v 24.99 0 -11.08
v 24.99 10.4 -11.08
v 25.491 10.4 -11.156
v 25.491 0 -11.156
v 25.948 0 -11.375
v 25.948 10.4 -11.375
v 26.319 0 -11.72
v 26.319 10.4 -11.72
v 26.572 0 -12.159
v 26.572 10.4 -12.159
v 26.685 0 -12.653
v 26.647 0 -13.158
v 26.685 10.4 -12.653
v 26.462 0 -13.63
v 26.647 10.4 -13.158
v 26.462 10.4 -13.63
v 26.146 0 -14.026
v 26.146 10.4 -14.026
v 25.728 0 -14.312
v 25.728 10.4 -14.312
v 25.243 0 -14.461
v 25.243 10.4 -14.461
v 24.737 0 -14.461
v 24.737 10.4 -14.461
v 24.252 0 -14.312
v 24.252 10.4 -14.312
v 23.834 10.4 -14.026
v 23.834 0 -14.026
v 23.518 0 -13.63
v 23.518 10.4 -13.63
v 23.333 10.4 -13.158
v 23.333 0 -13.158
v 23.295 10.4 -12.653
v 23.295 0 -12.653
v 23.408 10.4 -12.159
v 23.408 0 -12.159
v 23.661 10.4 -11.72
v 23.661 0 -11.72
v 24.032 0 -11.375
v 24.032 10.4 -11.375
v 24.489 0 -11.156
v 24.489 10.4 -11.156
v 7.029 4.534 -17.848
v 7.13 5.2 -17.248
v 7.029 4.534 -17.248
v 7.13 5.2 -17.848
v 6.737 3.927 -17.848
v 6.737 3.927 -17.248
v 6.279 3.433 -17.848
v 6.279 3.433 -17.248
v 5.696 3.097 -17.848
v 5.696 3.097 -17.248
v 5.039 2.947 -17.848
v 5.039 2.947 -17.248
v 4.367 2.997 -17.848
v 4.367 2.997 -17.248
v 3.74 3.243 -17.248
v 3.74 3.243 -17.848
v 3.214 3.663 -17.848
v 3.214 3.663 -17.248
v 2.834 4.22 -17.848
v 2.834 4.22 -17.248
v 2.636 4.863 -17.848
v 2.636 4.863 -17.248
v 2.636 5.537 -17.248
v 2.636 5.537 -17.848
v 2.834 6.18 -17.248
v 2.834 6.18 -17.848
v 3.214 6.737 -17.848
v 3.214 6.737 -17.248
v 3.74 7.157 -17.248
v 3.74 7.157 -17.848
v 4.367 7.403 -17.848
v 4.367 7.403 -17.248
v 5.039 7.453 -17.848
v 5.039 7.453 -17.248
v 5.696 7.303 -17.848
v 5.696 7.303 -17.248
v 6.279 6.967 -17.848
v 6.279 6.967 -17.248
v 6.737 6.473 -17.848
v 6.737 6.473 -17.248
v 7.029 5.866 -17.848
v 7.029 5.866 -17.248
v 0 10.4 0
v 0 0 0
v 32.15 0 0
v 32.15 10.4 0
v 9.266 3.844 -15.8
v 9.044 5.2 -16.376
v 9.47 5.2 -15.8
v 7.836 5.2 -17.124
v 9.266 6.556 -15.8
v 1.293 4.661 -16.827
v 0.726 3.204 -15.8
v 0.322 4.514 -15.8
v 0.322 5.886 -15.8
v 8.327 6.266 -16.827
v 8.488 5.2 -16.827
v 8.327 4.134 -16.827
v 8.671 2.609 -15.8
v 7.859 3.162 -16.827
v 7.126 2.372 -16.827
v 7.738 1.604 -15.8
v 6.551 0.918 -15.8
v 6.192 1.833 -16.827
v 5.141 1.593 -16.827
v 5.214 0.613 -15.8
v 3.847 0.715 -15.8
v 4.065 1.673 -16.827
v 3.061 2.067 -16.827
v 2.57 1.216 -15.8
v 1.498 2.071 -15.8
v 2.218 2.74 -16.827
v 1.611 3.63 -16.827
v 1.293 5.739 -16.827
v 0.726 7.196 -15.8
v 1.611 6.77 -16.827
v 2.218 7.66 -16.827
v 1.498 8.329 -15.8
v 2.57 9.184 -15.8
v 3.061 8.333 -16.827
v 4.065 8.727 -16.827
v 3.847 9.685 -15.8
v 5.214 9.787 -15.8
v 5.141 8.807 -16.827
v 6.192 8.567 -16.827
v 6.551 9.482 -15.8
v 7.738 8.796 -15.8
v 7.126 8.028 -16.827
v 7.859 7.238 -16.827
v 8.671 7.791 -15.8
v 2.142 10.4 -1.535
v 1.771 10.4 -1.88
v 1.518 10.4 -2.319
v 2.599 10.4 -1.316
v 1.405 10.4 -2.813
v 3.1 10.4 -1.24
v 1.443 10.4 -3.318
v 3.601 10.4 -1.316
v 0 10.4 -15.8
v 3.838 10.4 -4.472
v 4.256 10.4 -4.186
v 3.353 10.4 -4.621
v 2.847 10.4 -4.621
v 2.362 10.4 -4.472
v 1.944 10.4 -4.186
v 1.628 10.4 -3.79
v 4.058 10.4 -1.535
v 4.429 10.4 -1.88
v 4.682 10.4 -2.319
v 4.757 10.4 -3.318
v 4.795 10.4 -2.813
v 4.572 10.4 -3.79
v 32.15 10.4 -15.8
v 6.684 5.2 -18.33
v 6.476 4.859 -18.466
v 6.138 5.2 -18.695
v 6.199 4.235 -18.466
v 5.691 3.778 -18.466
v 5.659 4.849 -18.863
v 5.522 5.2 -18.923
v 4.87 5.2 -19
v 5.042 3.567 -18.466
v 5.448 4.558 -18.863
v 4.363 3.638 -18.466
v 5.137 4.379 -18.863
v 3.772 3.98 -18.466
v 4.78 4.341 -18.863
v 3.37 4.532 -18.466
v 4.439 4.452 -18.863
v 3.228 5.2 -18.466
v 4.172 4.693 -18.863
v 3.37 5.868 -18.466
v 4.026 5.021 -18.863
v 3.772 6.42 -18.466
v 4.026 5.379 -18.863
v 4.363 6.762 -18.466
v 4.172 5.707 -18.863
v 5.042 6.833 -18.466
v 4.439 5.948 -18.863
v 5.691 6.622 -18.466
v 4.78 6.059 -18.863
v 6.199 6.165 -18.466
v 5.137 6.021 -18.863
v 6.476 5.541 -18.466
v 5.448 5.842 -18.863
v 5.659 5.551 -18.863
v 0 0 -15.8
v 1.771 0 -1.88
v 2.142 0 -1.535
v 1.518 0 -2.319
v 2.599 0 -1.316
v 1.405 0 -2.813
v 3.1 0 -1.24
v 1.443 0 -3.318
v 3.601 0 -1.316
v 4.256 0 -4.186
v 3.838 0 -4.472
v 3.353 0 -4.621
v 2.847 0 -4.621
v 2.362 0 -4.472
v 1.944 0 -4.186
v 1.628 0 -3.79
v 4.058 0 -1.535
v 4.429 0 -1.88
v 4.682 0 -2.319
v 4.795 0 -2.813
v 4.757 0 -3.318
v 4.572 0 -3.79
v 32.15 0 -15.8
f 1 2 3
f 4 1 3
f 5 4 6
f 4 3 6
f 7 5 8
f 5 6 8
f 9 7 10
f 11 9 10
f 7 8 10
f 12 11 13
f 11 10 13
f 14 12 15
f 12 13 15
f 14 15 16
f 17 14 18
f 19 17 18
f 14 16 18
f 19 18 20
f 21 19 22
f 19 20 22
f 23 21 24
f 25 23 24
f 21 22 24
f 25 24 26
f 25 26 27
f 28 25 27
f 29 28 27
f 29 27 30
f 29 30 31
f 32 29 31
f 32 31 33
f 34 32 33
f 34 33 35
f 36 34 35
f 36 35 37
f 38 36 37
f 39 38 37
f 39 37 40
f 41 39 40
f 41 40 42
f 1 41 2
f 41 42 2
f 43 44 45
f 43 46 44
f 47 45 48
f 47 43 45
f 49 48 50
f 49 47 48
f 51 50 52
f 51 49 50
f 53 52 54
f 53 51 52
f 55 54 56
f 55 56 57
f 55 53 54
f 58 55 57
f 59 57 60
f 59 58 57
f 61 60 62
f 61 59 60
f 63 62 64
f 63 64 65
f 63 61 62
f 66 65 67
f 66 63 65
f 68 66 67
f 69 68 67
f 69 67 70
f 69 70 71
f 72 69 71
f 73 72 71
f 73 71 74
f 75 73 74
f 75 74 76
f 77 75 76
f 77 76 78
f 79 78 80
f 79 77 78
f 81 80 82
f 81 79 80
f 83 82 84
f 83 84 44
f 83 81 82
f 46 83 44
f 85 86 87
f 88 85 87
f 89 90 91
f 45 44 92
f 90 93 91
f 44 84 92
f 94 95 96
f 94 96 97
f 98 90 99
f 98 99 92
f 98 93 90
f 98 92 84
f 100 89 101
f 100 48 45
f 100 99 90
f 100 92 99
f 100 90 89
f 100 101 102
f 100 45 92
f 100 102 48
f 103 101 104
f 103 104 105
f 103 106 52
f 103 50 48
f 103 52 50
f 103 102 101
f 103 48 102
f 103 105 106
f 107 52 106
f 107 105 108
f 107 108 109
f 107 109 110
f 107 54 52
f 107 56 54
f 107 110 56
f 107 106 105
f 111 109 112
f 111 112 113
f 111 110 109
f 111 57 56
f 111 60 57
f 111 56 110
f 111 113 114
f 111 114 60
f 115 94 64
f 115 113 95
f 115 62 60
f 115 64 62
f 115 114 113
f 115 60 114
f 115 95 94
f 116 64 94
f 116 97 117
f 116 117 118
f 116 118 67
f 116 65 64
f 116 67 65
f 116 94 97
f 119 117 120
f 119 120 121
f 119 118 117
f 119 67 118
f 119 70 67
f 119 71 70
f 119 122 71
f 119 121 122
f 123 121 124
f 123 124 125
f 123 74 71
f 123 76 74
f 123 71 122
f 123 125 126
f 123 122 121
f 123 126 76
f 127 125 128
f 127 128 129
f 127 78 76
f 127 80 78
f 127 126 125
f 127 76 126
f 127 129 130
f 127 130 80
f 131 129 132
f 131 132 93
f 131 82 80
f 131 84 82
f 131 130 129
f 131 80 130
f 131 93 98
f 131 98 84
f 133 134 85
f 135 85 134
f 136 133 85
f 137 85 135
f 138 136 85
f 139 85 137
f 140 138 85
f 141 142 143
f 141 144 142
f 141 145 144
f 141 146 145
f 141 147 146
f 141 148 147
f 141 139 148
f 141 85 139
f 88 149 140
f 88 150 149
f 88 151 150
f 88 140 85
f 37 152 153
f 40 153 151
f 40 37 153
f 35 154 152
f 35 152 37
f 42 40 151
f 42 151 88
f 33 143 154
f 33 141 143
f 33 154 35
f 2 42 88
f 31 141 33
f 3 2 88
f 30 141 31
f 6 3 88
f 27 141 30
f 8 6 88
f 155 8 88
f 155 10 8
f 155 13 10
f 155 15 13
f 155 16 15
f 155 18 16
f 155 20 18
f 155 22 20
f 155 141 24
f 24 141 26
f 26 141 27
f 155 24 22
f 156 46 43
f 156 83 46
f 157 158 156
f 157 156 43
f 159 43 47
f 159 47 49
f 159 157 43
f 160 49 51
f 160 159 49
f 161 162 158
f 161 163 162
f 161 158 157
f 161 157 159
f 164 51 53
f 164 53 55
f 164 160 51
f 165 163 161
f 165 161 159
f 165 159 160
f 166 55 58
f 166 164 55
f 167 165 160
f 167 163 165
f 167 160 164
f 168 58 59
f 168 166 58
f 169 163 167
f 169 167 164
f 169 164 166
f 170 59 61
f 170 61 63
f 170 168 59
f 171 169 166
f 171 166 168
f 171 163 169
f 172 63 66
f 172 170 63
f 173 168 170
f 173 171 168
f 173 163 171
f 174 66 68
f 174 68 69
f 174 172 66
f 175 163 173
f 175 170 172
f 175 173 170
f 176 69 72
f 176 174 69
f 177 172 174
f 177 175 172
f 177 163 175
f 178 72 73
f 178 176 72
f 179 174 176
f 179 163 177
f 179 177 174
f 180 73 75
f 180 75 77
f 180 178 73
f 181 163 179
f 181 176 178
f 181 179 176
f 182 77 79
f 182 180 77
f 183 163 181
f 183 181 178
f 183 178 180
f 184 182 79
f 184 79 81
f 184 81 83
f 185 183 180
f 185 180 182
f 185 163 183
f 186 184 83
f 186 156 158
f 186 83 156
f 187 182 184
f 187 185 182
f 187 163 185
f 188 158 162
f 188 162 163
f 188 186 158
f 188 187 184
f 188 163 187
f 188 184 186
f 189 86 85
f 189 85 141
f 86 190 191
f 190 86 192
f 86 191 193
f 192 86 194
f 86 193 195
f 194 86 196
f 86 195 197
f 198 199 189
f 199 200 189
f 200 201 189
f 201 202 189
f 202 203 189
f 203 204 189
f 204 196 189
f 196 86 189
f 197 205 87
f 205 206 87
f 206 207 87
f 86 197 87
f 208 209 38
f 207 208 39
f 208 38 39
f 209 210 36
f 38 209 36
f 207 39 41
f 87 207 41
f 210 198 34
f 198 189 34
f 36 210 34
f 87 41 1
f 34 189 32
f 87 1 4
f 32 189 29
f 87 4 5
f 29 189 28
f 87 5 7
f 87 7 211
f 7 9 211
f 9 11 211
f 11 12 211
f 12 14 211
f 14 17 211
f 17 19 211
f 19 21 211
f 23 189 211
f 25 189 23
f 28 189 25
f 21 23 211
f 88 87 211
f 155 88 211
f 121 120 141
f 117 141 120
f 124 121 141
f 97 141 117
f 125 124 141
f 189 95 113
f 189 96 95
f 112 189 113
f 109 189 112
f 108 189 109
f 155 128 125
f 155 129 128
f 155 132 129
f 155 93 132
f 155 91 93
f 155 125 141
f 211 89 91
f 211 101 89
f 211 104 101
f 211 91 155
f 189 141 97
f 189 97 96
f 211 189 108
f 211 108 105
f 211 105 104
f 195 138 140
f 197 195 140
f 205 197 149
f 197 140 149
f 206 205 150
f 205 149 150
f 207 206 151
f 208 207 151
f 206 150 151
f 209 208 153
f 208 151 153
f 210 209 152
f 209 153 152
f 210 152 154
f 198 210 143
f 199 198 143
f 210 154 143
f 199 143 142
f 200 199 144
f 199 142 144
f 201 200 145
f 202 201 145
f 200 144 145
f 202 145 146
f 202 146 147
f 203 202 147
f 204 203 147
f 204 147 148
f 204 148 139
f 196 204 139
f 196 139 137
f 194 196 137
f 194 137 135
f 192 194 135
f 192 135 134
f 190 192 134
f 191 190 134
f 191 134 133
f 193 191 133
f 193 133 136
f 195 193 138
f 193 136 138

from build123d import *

# Parameters (mm, degrees)
SKETCH2_W           = 32.15
SKETCH2_H           = 15.8
BOSS_EXTRUDE1_DEPTH = 10.4
SKETCH3_R           = 1.7
CUT_EXTRUDE1_DEPTH  = 10.4


with BuildPart() as part:
    # Sketch2 → Boss-Extrude1 (new body)
    with BuildSketch(Plane(origin=(0, 0, 0), x_dir=(1, 0, 0), z_dir=(0, 1, 0))):
        with Locations((16.075, 7.9)):
            Rectangle(SKETCH2_W, SKETCH2_H)
    extrude(amount=BOSS_EXTRUDE1_DEPTH)

    # Sketch3 → Cut-Extrude1 (cut)
    with BuildSketch(Plane(origin=(0, 10.4, 0), x_dir=(1, 0, 0), z_dir=(0, 1, 0))):
        with Locations((3.1, 2.94)):
            Circle(SKETCH3_R)
        with Locations((24.99, 12.78)):
            Circle(SKETCH3_R)
    extrude(amount=-CUT_EXTRUDE1_DEPTH, mode=Mode.SUBTRACT)

    # Sketch13 → Revolve1 (revolve)
    with BuildSketch(Plane(origin=(0, 5.2, 0), x_dir=(1, 0, 0), z_dir=(0, 1, 0))):
        with BuildLine():
            Line((4.870191612, 15.8), (9.470191612, 15.8))
            ThreePointArc((9.470191612, 15.8), (8.487581187, 16.827034892), (7.12986911, 17.247679442))
            Line((7.12986911, 17.247679442), (7.12986911, 17.847679442))
            ThreePointArc((7.12986911, 17.847679442), (6.138456674, 18.695290943), (4.870191612, 19))
            Line((4.870191612, 19), (4.870191612, 15.8))
        make_face()
    revolve(axis=Axis((4.870191612, 5.2, -15.8), (0, 0, -1)))


solid = part.part
